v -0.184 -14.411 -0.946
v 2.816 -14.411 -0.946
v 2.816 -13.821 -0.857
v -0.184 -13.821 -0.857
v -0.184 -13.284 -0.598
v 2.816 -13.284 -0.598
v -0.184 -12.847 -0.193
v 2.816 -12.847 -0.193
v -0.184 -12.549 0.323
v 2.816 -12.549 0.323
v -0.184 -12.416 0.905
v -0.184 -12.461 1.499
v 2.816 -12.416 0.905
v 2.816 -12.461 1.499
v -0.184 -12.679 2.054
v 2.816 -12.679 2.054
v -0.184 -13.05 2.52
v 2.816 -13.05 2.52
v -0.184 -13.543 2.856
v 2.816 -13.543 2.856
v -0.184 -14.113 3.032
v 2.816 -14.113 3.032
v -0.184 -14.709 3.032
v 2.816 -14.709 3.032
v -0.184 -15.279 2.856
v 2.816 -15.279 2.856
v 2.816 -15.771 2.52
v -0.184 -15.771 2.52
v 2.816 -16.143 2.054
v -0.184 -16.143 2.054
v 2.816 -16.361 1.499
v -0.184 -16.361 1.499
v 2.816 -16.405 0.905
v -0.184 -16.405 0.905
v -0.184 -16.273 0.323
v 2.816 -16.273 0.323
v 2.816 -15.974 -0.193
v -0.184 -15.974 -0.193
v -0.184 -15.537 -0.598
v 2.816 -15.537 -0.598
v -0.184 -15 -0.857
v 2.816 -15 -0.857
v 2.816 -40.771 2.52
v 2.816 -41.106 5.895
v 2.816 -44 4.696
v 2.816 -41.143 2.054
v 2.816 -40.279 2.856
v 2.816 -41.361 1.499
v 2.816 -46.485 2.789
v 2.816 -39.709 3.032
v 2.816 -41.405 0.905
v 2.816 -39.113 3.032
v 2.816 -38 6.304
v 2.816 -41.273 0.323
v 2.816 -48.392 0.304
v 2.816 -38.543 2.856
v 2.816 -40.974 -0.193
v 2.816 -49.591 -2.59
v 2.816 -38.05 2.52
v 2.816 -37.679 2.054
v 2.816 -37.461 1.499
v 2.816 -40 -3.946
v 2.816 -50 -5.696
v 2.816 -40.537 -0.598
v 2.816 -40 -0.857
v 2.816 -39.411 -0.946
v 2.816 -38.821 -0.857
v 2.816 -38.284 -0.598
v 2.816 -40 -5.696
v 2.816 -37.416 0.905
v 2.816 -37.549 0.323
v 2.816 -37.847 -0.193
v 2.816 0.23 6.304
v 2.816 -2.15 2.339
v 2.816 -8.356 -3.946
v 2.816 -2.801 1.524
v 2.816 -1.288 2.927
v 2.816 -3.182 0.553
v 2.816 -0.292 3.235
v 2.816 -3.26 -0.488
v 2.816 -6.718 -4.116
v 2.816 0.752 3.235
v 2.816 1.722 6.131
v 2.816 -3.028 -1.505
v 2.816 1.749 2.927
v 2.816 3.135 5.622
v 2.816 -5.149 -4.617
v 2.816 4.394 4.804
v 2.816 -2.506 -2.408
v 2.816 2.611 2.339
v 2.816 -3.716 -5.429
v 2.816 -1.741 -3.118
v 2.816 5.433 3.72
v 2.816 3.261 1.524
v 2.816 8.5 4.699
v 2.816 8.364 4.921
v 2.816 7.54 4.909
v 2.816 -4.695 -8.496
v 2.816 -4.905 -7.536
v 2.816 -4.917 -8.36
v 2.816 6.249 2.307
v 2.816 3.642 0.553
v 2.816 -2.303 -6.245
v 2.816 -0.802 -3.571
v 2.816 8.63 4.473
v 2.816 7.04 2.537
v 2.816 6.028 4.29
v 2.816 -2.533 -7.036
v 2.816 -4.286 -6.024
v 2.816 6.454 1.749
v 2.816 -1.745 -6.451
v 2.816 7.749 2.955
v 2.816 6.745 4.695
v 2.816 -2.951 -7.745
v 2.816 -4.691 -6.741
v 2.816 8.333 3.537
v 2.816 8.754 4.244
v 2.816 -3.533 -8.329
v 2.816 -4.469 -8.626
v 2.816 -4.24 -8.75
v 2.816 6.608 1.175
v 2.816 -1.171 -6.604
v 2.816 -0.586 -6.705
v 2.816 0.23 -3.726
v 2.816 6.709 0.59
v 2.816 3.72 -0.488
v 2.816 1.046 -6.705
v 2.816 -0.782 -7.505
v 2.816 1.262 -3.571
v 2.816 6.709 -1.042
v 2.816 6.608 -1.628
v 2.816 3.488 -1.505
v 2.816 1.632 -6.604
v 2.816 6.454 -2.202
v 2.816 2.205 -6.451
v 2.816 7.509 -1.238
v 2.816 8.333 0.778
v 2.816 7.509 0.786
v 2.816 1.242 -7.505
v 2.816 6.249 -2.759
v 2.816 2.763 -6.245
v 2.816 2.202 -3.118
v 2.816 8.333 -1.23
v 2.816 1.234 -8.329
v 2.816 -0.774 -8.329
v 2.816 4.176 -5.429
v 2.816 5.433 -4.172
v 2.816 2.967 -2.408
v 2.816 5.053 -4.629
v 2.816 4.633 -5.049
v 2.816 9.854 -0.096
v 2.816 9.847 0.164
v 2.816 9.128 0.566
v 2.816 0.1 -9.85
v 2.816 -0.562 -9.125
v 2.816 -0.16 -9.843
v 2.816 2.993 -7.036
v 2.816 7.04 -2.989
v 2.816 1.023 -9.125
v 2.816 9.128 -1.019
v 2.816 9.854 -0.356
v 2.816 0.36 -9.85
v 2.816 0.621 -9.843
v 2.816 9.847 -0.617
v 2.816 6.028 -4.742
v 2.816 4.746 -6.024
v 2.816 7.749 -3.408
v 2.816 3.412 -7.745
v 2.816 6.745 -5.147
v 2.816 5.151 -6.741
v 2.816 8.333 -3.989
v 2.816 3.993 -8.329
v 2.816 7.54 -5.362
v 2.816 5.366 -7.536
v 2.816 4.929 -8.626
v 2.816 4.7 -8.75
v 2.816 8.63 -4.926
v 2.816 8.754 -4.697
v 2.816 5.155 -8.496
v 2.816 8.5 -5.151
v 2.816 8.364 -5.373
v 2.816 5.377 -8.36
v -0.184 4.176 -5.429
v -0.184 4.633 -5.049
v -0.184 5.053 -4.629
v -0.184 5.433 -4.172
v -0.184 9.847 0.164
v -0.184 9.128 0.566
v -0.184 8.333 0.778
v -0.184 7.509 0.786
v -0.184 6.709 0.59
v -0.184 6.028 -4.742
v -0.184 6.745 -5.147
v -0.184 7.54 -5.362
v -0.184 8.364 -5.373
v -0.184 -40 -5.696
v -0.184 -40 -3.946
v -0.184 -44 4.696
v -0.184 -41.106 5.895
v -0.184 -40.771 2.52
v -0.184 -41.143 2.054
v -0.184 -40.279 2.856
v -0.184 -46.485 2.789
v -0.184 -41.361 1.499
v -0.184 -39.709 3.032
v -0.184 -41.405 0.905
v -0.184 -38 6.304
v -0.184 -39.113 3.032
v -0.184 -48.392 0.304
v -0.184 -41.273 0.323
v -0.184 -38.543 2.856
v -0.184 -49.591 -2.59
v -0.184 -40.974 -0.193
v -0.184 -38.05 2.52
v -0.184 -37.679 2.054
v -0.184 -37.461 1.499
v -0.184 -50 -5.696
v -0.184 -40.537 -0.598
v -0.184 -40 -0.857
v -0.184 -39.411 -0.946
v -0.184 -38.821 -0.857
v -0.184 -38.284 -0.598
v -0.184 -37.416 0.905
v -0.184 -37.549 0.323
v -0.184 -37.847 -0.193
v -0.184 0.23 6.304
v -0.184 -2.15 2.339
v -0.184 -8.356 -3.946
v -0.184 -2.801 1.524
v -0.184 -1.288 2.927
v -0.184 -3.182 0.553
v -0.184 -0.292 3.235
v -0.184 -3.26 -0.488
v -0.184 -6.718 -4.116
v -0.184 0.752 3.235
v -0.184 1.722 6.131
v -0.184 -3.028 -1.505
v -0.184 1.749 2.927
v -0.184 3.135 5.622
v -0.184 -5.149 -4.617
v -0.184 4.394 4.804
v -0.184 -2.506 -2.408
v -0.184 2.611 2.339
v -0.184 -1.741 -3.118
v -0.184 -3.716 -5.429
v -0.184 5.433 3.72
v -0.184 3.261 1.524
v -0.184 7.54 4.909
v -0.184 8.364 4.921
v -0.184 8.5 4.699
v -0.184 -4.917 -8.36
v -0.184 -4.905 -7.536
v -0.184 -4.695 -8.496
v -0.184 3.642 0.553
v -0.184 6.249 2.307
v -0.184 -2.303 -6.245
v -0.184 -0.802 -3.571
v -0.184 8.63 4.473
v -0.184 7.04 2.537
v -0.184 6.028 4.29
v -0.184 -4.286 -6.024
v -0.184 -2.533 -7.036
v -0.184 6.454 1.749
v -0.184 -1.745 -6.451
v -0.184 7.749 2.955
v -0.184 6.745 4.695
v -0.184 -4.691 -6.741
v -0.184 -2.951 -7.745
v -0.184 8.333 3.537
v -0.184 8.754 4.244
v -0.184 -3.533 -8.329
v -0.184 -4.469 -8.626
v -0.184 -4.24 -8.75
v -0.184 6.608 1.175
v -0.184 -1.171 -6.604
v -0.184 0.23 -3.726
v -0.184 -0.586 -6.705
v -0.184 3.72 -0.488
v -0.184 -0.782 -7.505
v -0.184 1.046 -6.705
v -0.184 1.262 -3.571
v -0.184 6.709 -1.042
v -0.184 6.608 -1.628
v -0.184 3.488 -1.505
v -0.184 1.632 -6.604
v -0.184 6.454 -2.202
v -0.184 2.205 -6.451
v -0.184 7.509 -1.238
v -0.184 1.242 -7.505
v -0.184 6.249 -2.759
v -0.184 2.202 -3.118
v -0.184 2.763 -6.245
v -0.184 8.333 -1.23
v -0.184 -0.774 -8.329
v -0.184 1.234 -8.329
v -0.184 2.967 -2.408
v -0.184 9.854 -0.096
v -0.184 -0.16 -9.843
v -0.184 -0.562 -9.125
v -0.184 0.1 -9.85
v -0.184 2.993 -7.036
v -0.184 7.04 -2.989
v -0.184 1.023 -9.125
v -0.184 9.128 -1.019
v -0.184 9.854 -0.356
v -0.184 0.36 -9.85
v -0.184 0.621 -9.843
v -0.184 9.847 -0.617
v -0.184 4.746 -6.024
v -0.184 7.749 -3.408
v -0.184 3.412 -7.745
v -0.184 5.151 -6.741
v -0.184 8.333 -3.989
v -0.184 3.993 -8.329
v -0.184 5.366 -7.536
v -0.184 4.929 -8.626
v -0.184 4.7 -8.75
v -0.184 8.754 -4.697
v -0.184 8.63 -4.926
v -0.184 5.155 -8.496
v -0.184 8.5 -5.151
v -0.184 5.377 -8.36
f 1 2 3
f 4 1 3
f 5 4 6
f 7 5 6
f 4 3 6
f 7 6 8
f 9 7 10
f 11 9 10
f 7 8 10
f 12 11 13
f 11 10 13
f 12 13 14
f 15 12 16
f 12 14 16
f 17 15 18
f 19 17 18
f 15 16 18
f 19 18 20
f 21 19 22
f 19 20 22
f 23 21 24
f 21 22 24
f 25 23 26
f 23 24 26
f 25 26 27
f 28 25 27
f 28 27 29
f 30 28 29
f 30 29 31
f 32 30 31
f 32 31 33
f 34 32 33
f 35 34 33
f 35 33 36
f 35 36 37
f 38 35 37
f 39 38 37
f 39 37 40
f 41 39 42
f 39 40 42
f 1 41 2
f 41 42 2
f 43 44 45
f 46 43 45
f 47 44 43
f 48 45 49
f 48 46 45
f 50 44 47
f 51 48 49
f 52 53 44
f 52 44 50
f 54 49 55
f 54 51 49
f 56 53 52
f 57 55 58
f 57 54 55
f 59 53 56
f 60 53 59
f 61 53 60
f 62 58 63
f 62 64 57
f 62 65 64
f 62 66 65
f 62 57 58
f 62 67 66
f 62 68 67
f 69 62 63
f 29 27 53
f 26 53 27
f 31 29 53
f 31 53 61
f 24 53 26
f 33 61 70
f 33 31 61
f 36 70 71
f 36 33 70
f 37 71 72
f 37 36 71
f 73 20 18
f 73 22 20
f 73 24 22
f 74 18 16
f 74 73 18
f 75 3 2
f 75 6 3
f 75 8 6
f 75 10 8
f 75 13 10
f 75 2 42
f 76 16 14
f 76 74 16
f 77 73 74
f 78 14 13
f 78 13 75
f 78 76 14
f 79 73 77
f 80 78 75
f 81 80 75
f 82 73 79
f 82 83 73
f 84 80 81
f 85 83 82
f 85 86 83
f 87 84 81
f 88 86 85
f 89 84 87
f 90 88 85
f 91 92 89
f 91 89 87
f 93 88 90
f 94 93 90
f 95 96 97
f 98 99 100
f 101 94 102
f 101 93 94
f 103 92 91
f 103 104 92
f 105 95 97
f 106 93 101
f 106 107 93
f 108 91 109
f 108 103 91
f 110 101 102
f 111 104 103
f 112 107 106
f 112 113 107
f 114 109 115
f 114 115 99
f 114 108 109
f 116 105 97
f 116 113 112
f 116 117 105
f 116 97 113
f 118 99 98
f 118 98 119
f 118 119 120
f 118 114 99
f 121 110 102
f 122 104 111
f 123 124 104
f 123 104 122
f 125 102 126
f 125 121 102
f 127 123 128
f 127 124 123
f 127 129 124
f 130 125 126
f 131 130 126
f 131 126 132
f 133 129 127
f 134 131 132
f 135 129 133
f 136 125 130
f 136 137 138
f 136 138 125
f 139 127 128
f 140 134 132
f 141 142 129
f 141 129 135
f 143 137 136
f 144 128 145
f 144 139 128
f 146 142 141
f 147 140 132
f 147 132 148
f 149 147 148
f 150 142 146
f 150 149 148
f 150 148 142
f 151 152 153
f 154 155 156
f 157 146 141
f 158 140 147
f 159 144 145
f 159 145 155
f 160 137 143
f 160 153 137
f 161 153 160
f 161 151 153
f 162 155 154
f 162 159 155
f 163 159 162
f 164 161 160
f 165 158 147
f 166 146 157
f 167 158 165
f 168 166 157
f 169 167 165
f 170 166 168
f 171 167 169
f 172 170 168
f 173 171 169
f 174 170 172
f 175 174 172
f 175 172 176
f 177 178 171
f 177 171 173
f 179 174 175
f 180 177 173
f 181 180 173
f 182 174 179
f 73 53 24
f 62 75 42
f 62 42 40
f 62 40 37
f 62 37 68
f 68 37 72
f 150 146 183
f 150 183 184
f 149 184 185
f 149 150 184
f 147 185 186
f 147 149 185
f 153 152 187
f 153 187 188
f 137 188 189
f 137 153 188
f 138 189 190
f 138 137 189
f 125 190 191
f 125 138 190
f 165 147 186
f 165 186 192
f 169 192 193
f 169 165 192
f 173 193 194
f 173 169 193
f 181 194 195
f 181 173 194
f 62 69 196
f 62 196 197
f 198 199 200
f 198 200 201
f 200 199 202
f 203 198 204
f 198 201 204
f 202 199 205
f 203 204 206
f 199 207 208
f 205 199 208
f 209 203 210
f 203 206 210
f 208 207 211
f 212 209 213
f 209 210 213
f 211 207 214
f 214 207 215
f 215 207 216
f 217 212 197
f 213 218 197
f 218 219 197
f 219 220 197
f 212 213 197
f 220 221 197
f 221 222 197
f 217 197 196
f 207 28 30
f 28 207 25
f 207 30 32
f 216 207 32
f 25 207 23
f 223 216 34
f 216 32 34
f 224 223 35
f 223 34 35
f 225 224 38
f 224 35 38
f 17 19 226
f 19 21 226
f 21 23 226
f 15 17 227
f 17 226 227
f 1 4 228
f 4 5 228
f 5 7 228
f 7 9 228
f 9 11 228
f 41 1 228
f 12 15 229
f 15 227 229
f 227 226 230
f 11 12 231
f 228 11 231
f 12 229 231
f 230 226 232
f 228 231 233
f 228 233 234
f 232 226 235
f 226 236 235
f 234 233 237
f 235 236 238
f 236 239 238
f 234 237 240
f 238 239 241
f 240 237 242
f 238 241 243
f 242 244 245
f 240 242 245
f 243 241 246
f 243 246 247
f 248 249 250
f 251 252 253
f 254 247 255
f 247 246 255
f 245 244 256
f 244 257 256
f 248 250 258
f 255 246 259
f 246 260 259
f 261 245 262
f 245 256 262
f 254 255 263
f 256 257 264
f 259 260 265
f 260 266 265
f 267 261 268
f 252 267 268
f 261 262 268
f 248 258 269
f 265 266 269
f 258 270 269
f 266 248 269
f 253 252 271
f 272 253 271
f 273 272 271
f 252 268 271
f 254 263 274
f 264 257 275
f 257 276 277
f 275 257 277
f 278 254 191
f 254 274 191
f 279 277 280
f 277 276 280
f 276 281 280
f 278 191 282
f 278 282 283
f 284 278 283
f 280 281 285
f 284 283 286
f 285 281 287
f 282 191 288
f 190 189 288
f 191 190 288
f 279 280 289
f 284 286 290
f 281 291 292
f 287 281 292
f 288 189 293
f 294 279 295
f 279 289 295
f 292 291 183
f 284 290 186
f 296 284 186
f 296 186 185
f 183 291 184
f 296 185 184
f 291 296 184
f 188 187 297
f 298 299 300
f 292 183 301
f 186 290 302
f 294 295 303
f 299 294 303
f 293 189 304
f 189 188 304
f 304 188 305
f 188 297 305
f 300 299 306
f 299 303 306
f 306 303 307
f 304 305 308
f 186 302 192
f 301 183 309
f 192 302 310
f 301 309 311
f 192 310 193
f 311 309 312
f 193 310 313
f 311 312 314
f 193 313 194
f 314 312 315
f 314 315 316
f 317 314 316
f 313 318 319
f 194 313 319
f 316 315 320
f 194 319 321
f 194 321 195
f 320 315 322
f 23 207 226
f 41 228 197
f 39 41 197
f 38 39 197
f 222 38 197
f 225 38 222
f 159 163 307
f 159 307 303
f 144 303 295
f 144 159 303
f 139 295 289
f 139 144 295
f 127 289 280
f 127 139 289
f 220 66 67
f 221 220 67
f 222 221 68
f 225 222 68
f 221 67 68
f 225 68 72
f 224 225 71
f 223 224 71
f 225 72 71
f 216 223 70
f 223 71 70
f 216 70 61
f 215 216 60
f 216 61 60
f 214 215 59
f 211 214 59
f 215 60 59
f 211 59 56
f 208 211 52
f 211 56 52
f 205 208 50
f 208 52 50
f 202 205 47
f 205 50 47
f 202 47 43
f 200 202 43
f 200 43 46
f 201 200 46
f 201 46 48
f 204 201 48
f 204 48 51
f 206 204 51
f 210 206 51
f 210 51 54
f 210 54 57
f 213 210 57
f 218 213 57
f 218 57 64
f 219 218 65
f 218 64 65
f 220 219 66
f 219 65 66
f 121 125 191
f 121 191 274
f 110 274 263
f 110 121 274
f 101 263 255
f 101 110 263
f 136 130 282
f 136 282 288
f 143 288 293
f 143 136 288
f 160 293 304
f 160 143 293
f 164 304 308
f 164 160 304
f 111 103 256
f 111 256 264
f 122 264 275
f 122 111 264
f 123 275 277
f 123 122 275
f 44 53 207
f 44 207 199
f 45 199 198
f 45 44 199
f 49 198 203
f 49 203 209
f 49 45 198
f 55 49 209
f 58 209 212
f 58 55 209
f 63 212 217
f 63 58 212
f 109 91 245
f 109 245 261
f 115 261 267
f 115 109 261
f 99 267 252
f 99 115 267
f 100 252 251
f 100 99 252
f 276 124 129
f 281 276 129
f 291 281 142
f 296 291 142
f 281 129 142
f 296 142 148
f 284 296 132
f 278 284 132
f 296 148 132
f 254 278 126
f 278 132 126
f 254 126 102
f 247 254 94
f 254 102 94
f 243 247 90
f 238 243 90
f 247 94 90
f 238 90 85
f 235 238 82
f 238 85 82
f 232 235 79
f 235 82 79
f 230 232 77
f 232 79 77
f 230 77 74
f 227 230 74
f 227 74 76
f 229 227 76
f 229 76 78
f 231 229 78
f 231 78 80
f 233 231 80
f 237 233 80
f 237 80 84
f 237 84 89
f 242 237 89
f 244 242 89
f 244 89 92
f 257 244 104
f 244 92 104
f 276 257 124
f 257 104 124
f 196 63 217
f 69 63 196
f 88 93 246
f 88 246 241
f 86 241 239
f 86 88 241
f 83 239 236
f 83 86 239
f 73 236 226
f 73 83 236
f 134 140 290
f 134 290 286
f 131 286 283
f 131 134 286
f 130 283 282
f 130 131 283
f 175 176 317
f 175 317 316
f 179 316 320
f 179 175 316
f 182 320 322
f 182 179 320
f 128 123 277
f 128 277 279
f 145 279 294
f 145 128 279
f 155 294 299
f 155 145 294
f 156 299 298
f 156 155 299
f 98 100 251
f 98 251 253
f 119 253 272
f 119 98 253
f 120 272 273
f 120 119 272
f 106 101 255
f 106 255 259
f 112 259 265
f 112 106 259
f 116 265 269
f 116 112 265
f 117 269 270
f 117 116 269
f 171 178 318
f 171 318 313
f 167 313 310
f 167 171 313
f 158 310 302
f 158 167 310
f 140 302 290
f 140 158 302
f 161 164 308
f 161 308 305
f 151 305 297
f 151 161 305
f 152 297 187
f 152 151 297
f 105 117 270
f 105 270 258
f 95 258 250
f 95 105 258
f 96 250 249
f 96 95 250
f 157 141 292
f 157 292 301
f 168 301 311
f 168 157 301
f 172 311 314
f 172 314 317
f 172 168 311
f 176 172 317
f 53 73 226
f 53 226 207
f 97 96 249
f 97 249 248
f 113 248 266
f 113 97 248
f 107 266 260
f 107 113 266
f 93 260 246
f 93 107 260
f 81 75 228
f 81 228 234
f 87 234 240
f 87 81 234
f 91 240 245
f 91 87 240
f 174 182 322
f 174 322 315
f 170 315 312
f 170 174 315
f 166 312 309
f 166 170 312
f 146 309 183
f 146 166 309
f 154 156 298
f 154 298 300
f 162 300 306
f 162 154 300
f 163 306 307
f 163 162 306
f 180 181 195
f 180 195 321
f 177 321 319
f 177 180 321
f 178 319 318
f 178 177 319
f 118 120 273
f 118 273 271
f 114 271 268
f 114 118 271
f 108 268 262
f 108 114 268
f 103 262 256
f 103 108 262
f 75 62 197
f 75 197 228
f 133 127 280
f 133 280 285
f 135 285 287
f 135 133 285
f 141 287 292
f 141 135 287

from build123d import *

# Parameters (mm, degrees)
CROQUIS1_R              = 2
CROQUIS1_R_2            = 3.5
SALIENTE_EXTRUIR1_DEPTH = 3


with BuildPart() as part:
    # Croquis1 → Saliente-Extruir1 (new body)
    with BuildSketch(Plane(origin=(2.816112381, 0, 0), x_dir=(0, 0, -1), z_dir=(1, 0, 0))):
        with BuildLine():
            Line((-6.304052244, 0.230126664), (-6.304052244, -38))
            ThreePointArc((-6.304052244, -38), (-2.789333619, -46.485281374), (5.695947756, -50))
            Line((5.695947756, -50), (5.695947756, -40))
            Line((5.695947756, -40), (3.945947756, -40))
            Line((3.945947756, -40), (3.945947756, -8.356393503))
            ThreePointArc((3.945947756, -8.356393503), (4.325796585, -5.920557684), (5.42927179, -3.716034211))
            ThreePointArc((5.42927179, -3.716034211), (6.741018488, -4.690759176), (8.359590341, -4.916576169))
            ThreePointArc((8.359590341, -4.916576169), (8.561692267, -4.582373336), (8.750069448, -4.240246517))
            ThreePointArc((8.750069448, -4.240246517), (7.745220269, -2.951430671), (6.245210338, -2.302787189))
            ThreePointArc((6.245210338, -2.302787189), (6.533934883, -1.460026405), (6.705272485, -0.585811884))
            ThreePointArc((6.705272485, -0.585811884), (8.328640931, -0.774075116), (9.84327377, -0.160352443))
            ThreePointArc((9.84327377, -0.160352443), (9.851197756, 0.230126664), (9.84327377, 0.620605771))
            ThreePointArc((9.84327377, 0.620605771), (8.328640931, 1.234328445), (6.705272485, 1.046065213))
            ThreePointArc((6.705272485, 1.046065213), (6.533934883, 1.920279734), (6.245210338, 2.763040518))
            ThreePointArc((6.245210338, 2.763040518), (7.745220269, 3.411683999), (8.750069448, 4.700499845))
            ThreePointArc((8.750069448, 4.700499845), (8.561692267, 5.042626664), (8.359590341, 5.376829498))
            ThreePointArc((8.359590341, 5.376829498), (6.741018488, 5.151012505), (5.42927179, 4.17628754))
            ThreePointArc((5.42927179, 4.17628754), (4.843781813, 4.847710722), (4.172358631, 5.433200699))
            ThreePointArc((4.172358631, 5.433200699), (5.147083596, 6.744947397), (5.372900589, 8.363519249))
            ThreePointArc((5.372900589, 8.363519249), (5.038697756, 8.565621176), (4.696570936, 8.753998356))
            ThreePointArc((4.696570936, 8.753998356), (3.407755091, 7.749149177), (2.759111609, 6.249139247))
            ThreePointArc((2.759111609, 6.249139247), (1.916350825, 6.537863791), (1.042136304, 6.709201394))
            ThreePointArc((1.042136304, 6.709201394), (1.230399536, 8.33256984), (0.616676863, 9.847202679))
            ThreePointArc((0.616676863, 9.847202679), (0.226197756, 9.855126664), (-0.164281352, 9.847202679))
            ThreePointArc((-0.164281352, 9.847202679), (-0.778004025, 8.33256984), (-0.589740793, 6.709201394))
            ThreePointArc((-0.589740793, 6.709201394), (-1.463955314, 6.537863791), (-2.306716098, 6.249139247))
            ThreePointArc((-2.306716098, 6.249139247), (-2.95535958, 7.749149177), (-4.244175425, 8.753998356))
            ThreePointArc((-4.244175425, 8.753998356), (-4.586302244, 8.565621176), (-4.920505078, 8.363519249))
            ThreePointArc((-4.920505078, 8.363519249), (-4.694688085, 6.744947397), (-3.71996312, 5.433200699))
            ThreePointArc((-3.71996312, 5.433200699), (-5.622459446, 3.134842486), (-6.304052244, 0.230126664))
        make_face()
        with Locations((-1.054052244, -14.410797367)):
            Circle(CROQUIS1_R, mode=Mode.SUBTRACT)
        with Locations((-1.054052244, -39.410797367)):
            Circle(CROQUIS1_R, mode=Mode.SUBTRACT)
        with Locations((0.226197756, 0.230126664)):
            Circle(CROQUIS1_R_2, mode=Mode.SUBTRACT)
    extrude(amount=-SALIENTE_EXTRUIR1_DEPTH)


solid = part.part
